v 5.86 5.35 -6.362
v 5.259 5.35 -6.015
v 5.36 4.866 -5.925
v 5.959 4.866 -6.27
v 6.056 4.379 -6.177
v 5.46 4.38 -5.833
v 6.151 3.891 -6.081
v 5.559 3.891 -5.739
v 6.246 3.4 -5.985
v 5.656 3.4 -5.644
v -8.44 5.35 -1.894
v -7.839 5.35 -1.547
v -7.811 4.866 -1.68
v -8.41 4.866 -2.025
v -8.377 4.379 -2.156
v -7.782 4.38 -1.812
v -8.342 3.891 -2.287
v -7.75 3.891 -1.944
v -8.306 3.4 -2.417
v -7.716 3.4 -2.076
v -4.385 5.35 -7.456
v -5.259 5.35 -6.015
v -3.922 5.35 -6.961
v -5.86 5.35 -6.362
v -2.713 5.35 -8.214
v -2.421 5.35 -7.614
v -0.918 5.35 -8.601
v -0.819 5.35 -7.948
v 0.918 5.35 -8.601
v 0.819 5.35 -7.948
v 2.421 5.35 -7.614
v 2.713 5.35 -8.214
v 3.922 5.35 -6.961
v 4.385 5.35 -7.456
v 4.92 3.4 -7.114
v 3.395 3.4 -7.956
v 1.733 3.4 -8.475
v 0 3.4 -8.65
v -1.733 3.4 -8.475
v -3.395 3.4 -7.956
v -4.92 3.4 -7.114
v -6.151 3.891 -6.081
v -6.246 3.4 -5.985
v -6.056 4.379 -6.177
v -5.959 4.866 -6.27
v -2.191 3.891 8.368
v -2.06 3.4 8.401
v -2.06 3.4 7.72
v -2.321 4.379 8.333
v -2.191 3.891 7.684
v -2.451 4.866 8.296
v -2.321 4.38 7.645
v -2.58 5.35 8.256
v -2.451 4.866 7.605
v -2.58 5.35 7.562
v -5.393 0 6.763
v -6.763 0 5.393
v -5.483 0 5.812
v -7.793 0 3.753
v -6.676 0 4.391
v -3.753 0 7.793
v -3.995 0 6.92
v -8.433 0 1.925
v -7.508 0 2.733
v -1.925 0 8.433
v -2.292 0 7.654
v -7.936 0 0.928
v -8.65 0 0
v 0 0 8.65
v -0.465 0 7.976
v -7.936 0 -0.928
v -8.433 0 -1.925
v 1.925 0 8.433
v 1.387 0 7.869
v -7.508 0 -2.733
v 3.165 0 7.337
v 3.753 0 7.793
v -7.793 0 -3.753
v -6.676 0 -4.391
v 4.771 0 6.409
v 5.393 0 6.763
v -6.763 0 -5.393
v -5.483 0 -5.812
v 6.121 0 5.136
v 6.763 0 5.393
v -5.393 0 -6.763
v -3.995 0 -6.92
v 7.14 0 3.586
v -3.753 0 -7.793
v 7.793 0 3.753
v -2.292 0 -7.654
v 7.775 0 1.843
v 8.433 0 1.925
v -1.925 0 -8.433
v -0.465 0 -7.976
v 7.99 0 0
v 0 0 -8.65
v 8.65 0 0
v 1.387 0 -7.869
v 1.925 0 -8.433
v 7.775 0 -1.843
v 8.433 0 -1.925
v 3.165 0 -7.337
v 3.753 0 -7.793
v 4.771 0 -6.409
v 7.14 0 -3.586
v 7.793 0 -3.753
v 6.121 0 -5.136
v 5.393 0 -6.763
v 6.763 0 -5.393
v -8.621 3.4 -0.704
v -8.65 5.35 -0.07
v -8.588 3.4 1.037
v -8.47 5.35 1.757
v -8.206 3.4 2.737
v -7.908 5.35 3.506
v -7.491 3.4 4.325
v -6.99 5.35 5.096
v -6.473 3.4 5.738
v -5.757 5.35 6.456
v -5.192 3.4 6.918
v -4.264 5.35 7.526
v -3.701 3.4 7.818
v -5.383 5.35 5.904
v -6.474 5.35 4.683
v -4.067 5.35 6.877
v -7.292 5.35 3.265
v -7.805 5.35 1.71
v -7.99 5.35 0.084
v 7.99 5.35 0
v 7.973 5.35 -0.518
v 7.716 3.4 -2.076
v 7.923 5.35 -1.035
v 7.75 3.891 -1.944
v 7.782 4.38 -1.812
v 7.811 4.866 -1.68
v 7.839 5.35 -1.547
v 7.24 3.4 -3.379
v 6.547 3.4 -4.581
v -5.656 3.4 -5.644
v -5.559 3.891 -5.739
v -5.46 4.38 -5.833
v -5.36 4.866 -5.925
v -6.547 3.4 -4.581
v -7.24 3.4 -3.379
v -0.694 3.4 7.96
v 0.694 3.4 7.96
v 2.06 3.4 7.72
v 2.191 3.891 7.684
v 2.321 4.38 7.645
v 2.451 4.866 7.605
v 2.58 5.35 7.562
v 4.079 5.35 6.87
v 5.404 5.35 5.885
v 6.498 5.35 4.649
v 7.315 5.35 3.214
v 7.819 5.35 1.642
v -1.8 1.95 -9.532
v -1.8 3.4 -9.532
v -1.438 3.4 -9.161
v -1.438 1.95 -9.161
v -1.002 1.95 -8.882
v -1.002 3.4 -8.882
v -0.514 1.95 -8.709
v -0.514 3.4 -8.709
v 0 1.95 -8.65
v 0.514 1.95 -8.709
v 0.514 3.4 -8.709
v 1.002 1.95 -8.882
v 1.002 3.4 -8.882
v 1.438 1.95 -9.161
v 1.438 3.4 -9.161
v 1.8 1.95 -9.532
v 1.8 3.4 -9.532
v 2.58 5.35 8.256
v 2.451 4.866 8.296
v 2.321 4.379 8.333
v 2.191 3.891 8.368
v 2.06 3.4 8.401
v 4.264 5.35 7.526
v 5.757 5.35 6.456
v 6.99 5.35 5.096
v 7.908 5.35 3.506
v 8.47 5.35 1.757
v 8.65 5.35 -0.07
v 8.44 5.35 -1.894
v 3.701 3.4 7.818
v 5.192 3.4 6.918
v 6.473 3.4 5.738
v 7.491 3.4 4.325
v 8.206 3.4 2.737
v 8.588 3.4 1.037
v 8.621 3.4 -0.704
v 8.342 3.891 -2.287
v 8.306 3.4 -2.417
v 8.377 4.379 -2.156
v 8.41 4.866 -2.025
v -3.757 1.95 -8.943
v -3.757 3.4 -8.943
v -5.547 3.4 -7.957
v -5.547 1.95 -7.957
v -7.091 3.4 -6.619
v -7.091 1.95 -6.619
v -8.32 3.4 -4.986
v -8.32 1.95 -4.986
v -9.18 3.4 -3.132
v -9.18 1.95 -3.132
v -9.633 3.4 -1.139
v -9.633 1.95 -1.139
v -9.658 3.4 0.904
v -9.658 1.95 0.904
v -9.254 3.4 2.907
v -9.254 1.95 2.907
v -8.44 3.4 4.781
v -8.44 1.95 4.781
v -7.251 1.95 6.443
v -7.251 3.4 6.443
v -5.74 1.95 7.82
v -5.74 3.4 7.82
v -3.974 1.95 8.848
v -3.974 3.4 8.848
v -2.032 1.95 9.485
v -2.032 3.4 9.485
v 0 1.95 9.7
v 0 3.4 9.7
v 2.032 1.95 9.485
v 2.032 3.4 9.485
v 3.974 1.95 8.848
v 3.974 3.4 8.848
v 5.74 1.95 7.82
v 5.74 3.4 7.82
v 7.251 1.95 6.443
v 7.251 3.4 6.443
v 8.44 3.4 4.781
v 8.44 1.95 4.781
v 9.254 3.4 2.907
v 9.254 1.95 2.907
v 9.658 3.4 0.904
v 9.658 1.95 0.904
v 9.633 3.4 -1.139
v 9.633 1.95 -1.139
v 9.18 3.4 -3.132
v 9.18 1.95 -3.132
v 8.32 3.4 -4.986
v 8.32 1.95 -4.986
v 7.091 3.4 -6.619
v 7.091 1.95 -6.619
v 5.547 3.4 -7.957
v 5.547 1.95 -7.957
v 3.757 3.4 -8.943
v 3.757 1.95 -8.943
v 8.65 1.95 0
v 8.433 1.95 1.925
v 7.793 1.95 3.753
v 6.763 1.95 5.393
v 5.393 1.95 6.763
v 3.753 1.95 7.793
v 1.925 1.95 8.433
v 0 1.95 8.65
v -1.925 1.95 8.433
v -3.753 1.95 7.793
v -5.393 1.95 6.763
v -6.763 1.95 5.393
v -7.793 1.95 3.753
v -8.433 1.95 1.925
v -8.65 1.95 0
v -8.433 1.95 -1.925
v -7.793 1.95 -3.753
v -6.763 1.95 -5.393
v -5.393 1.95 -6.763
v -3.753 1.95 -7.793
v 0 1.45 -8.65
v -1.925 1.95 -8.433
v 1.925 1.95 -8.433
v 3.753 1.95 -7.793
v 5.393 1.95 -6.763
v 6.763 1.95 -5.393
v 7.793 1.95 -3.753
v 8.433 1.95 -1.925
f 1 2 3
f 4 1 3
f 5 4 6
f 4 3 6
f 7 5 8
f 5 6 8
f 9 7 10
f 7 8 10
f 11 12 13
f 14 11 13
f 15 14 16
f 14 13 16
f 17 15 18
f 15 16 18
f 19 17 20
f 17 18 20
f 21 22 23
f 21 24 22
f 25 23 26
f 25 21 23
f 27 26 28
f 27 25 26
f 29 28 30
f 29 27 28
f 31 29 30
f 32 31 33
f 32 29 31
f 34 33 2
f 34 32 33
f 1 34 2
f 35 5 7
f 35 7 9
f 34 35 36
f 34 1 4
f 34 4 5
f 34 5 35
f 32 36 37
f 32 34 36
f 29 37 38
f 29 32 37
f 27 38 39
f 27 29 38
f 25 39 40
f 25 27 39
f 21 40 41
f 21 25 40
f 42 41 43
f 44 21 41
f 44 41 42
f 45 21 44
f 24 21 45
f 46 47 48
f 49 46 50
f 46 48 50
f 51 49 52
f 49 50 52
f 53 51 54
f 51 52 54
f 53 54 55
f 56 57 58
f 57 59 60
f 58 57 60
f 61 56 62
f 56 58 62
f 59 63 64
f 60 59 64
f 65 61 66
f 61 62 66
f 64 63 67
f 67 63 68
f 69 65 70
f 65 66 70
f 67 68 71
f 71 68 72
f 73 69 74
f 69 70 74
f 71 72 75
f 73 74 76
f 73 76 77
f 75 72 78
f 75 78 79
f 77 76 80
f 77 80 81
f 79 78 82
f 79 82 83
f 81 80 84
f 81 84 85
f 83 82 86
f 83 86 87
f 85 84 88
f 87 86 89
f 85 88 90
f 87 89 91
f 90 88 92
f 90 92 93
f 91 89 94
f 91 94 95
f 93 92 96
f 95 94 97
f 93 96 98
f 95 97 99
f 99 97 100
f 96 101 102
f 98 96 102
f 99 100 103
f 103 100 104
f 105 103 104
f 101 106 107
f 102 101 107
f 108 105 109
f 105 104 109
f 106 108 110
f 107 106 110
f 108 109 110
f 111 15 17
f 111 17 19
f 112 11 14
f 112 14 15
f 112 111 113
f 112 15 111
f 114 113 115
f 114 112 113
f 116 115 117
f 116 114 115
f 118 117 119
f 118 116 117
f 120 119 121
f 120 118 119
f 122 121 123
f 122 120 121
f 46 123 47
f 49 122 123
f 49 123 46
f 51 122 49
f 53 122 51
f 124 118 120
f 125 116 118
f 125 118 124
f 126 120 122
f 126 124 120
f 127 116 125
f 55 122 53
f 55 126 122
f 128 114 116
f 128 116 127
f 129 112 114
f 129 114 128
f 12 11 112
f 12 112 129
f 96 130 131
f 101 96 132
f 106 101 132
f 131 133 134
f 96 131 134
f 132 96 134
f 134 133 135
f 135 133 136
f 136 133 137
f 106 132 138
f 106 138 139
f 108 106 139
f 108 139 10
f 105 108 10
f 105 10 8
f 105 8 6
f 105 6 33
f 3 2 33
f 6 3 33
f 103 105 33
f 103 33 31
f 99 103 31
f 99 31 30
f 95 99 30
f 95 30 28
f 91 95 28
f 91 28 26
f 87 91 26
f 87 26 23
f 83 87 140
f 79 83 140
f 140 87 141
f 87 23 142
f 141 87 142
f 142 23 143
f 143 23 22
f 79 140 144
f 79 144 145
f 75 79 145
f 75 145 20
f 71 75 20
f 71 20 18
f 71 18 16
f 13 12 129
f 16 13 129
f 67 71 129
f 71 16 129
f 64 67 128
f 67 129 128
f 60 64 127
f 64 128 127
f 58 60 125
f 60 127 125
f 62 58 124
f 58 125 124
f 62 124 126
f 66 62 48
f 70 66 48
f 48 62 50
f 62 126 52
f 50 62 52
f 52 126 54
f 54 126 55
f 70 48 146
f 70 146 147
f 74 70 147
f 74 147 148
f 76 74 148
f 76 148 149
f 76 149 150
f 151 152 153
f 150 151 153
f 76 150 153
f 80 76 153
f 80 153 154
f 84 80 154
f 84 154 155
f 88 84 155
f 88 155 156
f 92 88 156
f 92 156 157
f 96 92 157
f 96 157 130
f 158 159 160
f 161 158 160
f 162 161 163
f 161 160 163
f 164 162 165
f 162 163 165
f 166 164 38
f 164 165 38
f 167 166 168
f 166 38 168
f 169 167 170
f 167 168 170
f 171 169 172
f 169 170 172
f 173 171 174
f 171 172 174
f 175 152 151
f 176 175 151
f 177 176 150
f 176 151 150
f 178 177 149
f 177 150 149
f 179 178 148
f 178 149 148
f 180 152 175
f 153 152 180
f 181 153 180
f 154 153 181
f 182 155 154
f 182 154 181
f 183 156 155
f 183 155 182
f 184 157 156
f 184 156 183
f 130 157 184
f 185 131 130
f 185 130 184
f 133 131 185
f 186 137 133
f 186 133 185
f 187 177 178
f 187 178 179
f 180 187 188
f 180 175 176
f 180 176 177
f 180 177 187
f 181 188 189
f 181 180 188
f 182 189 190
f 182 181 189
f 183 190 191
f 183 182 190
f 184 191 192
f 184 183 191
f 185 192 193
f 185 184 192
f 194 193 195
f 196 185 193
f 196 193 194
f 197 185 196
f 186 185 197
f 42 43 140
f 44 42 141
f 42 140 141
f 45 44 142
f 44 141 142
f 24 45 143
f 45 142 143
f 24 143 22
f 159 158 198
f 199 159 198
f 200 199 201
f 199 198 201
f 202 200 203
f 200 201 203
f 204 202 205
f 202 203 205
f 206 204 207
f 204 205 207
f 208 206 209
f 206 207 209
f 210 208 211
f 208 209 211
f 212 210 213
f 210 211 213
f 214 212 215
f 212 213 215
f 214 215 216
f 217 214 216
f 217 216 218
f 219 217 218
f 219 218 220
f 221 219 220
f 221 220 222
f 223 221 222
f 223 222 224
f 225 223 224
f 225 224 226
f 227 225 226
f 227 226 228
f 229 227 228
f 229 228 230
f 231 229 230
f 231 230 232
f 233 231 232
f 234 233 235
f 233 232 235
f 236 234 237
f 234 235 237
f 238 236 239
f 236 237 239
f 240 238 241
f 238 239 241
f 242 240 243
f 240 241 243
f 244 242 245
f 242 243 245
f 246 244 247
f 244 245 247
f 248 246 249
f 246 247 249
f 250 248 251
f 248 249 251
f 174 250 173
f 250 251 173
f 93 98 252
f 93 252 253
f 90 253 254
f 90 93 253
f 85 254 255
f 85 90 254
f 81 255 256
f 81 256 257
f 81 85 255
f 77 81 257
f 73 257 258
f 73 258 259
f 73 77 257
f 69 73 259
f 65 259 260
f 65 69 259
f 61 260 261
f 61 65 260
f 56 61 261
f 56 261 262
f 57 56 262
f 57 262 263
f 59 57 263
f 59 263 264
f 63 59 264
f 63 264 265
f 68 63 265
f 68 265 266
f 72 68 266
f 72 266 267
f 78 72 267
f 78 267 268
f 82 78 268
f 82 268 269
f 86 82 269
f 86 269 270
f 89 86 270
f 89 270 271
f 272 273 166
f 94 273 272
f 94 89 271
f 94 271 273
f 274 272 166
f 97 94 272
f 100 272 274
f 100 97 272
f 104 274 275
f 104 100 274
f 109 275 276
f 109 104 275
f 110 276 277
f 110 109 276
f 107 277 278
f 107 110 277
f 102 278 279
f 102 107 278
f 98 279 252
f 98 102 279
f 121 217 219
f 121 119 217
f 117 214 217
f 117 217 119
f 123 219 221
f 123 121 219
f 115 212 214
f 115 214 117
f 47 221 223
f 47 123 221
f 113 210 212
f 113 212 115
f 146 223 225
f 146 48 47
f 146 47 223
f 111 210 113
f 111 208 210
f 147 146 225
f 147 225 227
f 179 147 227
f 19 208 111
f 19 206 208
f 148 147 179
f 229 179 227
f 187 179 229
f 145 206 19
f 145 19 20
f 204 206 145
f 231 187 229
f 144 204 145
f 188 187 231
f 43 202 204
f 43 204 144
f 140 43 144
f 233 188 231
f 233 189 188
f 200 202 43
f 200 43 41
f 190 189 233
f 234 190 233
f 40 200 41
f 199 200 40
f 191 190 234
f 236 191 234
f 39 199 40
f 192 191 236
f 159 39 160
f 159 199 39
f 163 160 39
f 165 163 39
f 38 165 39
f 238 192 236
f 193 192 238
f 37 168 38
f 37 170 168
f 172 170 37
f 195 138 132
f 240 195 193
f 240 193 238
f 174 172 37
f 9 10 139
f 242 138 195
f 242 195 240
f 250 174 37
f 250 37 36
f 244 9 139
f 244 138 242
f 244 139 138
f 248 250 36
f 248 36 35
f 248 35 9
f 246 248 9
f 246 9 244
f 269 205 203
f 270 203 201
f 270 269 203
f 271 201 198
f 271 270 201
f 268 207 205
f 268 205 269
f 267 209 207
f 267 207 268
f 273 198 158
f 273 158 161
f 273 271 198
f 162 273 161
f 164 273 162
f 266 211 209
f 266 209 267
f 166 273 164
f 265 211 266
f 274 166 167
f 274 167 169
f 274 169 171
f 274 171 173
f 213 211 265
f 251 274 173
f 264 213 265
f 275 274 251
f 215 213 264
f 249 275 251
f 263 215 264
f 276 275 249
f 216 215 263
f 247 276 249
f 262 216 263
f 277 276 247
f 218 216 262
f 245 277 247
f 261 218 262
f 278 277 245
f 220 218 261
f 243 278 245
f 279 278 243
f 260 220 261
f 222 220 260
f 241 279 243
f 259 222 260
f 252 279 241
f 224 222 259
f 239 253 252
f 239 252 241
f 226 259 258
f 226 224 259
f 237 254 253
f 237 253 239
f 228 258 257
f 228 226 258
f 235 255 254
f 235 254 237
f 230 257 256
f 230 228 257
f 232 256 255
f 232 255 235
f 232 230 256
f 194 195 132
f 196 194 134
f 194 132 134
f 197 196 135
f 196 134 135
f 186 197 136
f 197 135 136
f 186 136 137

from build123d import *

# Parameters (mm, degrees)
SKETCH1_R               = 9.7
BOSS_EXTRUDE1_DEPTH     = 5.35
SKETCH2_R               = 9.7
SKETCH2_R_2             = 8.65
CUT_EXTRUDE1_DEPTH      = 1.95
SKETCH3_R               = 9.7
SKETCH3_R_2             = 8.65
CUT_EXTRUDE2_DEPTH      = 1.95
CUT_EXTRUDE3_DEPTH      = 2.95
CUT_EXTRUDE3_DEPTH_BACK = 1.95
SKETCH5_R               = 7.99
CUT_EXTRUDE4_DEPTH      = 6.35
CUT_EXTRUDE5_DEPTH      = 10.7
CIRPATTERN1_COUNT       = 3


with BuildPart() as part:
    # Sketch1 → Boss-Extrude1 (new body)
    with BuildSketch(Plane(origin=(0, 0, 0), x_dir=(1, 0, 0), z_dir=(0, 1, 0))):
        Circle(SKETCH1_R)
    extrude(amount=BOSS_EXTRUDE1_DEPTH)

    # Sketch2 → Cut-Extrude1 (cut)
    with BuildSketch(Plane(origin=(0, 5.35, 0), x_dir=(1, 0, 0), z_dir=(0, 1, 0))):
        Circle(SKETCH2_R)
        Circle(SKETCH2_R_2, mode=Mode.SUBTRACT)
    extrude(amount=-CUT_EXTRUDE1_DEPTH, mode=Mode.SUBTRACT)

    # Sketch3 → Cut-Extrude2 (cut)
    with BuildSketch(Plane.XZ):
        Circle(SKETCH3_R)
        Circle(SKETCH3_R_2, mode=Mode.SUBTRACT)
    extrude(amount=-CUT_EXTRUDE2_DEPTH, mode=Mode.SUBTRACT)

    # Sketch4 → Cut-Extrude3 (cut, two sides)
    with BuildSketch(Plane(origin=(0, 3.4, 0), x_dir=(1, 0, 0), z_dir=(0, 1, 0))) as cut_extrude3_sk:
        with BuildLine():
            Line((-35.407684365, 52.835510073), (-1.8, 9.531526635))
            ThreePointArc((-1.8, 9.531526635), (0, 8.65), (1.8, 9.531526635))
            Line((1.8, 9.531526635), (35.407684365, 52.835510073))
            Line((35.407684365, 52.835510073), (35.407684365, 162.466006376))
            Line((35.407684365, 162.466006376), (-35.407684365, 162.466006376))
            Line((-35.407684365, 162.466006376), (-35.407684365, 52.835510073))
        make_face()
    extrude(amount=CUT_EXTRUDE3_DEPTH, mode=Mode.SUBTRACT)
    extrude(cut_extrude3_sk.sketch, amount=-CUT_EXTRUDE3_DEPTH_BACK, mode=Mode.SUBTRACT)

    # Sketch5 → Cut-Extrude4 (cut, through all)
    with BuildSketch(Plane(origin=(0, 5.35, 0), x_dir=(1, 0, 0), z_dir=(0, 1, 0))):
        Circle(SKETCH5_R)
    extrude(amount=-CUT_EXTRUDE4_DEPTH, mode=Mode.SUBTRACT)

    # Sketch6 → Cut-Extrude5 (cut, through all)
    with BuildSketch(Plane.XY):
        Polygon((0, 3.4), (-2.06, 3.4), (-2.58, 5.35), (0, 5.35), (2.58, 5.35), (2.06, 3.4), align=None)
    cut_extrude5 = extrude(amount=CUT_EXTRUDE5_DEPTH, mode=Mode.SUBTRACT)

    # CirPattern1: Cut-Extrude5 ×3 about axis
    cirpattern1_axis = Axis((0, 0, 0), (0, 1, 0))
    for i in range(1, CIRPATTERN1_COUNT):
        add(cut_extrude5.rotate(cirpattern1_axis, i * 360 / CIRPATTERN1_COUNT), mode=Mode.SUBTRACT)


solid = part.part
